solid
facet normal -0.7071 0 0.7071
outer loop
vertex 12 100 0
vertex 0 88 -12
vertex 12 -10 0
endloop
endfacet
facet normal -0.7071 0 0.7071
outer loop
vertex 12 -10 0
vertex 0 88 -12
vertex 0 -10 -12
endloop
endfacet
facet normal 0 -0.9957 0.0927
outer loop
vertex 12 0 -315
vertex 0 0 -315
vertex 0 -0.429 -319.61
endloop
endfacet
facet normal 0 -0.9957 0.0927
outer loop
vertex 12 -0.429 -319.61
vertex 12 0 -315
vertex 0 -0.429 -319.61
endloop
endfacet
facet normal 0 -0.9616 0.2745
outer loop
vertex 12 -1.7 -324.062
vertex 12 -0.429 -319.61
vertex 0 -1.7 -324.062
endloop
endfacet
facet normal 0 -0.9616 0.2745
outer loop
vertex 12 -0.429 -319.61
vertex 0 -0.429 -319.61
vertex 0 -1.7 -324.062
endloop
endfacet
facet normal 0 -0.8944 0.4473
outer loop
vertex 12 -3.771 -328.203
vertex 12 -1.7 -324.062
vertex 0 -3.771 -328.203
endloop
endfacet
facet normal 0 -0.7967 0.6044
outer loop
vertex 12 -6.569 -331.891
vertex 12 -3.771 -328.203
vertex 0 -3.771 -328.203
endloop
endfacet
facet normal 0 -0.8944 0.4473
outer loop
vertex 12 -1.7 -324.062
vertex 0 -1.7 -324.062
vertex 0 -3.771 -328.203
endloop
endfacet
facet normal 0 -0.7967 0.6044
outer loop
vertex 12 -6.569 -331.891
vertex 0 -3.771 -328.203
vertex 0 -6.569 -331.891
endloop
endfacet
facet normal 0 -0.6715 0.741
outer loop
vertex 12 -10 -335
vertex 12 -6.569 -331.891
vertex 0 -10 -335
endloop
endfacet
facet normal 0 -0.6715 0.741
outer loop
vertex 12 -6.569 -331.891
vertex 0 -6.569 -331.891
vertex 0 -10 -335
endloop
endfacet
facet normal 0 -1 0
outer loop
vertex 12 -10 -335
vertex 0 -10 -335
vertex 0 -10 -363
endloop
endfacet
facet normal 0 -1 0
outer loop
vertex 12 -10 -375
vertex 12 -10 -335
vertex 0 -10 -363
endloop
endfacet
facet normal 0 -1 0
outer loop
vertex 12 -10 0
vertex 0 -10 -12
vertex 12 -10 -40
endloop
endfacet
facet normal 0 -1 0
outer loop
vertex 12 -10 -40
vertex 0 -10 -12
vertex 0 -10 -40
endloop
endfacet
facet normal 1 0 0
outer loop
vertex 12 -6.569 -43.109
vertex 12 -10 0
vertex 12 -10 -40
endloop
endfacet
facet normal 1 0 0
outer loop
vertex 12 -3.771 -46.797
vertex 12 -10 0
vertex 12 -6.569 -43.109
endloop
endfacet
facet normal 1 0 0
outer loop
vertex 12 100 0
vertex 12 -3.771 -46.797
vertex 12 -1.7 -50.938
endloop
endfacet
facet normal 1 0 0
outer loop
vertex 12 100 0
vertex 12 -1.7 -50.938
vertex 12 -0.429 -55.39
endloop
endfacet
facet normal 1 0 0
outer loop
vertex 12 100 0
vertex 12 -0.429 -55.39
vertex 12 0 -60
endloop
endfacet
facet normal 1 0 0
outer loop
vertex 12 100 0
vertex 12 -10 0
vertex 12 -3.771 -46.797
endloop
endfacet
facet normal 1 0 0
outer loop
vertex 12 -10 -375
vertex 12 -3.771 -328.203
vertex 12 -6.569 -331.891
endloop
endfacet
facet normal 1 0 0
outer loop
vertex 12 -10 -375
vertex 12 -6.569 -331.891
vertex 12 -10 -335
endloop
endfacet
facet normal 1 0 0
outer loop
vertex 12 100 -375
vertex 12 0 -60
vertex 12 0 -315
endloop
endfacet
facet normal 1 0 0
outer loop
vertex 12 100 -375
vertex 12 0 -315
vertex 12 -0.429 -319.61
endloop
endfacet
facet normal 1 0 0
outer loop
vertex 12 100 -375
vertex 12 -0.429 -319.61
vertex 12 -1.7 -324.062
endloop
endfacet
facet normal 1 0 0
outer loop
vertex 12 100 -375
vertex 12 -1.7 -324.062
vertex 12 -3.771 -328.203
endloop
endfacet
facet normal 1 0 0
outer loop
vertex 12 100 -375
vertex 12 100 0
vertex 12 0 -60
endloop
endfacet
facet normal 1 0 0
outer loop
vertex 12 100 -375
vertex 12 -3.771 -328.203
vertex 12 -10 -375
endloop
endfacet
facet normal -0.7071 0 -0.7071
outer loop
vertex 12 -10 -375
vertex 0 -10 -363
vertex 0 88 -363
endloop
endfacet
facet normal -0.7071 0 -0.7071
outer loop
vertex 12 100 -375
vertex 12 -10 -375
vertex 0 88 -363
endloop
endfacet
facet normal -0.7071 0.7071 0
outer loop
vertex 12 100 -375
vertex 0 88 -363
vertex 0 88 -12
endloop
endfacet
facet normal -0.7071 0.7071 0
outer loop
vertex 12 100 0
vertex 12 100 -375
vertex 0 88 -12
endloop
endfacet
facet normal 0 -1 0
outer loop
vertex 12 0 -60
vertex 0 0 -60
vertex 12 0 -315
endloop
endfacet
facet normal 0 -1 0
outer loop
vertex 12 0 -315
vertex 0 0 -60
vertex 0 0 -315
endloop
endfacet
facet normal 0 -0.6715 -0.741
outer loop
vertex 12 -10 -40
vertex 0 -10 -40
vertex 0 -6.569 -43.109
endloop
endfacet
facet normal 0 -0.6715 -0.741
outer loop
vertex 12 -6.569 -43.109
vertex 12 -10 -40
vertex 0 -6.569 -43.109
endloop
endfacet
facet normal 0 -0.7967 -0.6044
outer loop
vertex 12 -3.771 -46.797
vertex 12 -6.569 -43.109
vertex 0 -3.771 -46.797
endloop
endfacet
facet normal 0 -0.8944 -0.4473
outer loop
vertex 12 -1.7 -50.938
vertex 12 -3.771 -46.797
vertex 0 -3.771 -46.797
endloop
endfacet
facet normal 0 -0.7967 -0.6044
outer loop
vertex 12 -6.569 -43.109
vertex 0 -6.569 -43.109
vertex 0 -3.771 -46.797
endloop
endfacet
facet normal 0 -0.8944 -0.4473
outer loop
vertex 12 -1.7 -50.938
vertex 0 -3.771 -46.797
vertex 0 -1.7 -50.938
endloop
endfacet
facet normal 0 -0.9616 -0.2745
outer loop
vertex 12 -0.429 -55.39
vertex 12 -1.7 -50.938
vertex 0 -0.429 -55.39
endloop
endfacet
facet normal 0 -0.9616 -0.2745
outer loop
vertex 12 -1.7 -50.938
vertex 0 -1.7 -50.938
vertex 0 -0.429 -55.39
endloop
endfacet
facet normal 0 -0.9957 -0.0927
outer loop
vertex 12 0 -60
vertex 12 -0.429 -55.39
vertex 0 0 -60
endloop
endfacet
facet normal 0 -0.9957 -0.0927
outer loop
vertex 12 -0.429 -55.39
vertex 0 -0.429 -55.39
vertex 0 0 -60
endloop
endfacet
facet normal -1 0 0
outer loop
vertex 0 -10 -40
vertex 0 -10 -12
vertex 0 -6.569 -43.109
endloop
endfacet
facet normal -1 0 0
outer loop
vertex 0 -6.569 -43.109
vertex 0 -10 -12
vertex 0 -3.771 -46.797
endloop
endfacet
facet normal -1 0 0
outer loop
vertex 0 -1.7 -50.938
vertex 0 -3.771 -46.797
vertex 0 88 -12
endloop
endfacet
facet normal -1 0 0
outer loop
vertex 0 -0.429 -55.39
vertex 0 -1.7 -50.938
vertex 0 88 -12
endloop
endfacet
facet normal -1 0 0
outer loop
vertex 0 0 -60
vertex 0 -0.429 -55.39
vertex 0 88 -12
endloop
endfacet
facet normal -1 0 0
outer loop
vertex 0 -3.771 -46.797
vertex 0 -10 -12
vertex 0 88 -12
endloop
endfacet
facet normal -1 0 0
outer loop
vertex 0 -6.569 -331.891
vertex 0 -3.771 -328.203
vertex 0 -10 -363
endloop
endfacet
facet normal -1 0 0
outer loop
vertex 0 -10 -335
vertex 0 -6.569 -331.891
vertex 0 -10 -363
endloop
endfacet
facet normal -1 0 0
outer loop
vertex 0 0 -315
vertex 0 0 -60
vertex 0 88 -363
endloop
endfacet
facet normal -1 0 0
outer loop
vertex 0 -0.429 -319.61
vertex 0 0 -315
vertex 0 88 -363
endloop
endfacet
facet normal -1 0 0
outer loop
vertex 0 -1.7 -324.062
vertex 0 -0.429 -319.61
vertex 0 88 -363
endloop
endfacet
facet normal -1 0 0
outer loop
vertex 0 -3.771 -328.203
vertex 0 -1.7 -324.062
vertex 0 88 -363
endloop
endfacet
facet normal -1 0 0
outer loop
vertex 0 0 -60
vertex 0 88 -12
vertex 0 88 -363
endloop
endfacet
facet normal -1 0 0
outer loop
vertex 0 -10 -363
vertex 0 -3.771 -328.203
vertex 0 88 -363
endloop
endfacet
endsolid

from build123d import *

# Parameters (mm, degrees)
BOSS_EXTRUDE1_DEPTH = 12
CHAMFER1_SIZE       = 12


with BuildPart() as part:
    # Sketch1 → Boss-Extrude1 (new body)
    with BuildSketch(Plane(origin=(0, 0, 0), x_dir=(0, 0, -1), z_dir=(1, 0, 0))):
        with BuildLine():
            Line((0, 0), (0, -10))
            Line((0, -10), (40, -10))
            ThreePointArc((40, -10), (48.819660113, -2.639320225), (60, 0))
            Line((60, 0), (315, 0))
            ThreePointArc((315, 0), (326.180339887, -2.639320225), (335, -10))
            Line((335, -10), (375, -10))
            Line((375, -10), (375, 0))
            Line((375, 0), (375, 100))
            Line((375, 100), (0, 100))
            Line((0, 100), (0, 0))
        make_face()
    extrude(amount=BOSS_EXTRUDE1_DEPTH)

    # Chamfer1
    chamfer1_edges = [part.edges().sort_by_distance(p)[0] for p in [
        (0, 45, -375),
        (0, 45, 0),
        (0, 100, -187.5),
    ]]
    chamfer(chamfer1_edges, length=CHAMFER1_SIZE - 0.0001)  # a hair under: the kernel refuses the full size


solid = part.part
